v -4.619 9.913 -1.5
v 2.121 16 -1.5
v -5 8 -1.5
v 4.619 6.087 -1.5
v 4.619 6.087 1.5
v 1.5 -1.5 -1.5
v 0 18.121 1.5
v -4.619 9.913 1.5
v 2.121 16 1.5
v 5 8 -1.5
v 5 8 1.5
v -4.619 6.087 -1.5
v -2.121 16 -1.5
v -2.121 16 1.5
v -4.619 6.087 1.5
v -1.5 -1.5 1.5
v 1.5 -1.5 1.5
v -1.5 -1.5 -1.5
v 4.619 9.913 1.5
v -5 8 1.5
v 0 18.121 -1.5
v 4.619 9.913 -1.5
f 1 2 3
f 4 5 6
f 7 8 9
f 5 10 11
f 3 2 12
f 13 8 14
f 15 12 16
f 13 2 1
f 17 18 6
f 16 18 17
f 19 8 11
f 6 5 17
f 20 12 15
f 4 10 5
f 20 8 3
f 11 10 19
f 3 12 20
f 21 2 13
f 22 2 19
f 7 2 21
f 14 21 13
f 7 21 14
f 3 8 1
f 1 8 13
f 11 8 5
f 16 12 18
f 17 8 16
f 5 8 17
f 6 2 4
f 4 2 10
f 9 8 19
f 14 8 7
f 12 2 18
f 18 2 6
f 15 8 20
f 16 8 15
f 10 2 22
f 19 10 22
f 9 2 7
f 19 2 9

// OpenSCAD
///< Petals tutorial from all3dp
///< https://all3dp.com/2/openscad-tutorial-for-advanced-users-modules-functions/

module petal(length, width, thickness){
     hull(){
	  cube(thickness, center=true);///Petal base
	  translate([0,length/2,0])
	       cylinder(r=width/2, h=thickness, center=true);///Petal middle
	  translate([0,length,0])
	       rotate([0,0,45])cube(thickness, center=true);///Petal tip
     }
}

petal(length=16, width=10, thickness=3);
